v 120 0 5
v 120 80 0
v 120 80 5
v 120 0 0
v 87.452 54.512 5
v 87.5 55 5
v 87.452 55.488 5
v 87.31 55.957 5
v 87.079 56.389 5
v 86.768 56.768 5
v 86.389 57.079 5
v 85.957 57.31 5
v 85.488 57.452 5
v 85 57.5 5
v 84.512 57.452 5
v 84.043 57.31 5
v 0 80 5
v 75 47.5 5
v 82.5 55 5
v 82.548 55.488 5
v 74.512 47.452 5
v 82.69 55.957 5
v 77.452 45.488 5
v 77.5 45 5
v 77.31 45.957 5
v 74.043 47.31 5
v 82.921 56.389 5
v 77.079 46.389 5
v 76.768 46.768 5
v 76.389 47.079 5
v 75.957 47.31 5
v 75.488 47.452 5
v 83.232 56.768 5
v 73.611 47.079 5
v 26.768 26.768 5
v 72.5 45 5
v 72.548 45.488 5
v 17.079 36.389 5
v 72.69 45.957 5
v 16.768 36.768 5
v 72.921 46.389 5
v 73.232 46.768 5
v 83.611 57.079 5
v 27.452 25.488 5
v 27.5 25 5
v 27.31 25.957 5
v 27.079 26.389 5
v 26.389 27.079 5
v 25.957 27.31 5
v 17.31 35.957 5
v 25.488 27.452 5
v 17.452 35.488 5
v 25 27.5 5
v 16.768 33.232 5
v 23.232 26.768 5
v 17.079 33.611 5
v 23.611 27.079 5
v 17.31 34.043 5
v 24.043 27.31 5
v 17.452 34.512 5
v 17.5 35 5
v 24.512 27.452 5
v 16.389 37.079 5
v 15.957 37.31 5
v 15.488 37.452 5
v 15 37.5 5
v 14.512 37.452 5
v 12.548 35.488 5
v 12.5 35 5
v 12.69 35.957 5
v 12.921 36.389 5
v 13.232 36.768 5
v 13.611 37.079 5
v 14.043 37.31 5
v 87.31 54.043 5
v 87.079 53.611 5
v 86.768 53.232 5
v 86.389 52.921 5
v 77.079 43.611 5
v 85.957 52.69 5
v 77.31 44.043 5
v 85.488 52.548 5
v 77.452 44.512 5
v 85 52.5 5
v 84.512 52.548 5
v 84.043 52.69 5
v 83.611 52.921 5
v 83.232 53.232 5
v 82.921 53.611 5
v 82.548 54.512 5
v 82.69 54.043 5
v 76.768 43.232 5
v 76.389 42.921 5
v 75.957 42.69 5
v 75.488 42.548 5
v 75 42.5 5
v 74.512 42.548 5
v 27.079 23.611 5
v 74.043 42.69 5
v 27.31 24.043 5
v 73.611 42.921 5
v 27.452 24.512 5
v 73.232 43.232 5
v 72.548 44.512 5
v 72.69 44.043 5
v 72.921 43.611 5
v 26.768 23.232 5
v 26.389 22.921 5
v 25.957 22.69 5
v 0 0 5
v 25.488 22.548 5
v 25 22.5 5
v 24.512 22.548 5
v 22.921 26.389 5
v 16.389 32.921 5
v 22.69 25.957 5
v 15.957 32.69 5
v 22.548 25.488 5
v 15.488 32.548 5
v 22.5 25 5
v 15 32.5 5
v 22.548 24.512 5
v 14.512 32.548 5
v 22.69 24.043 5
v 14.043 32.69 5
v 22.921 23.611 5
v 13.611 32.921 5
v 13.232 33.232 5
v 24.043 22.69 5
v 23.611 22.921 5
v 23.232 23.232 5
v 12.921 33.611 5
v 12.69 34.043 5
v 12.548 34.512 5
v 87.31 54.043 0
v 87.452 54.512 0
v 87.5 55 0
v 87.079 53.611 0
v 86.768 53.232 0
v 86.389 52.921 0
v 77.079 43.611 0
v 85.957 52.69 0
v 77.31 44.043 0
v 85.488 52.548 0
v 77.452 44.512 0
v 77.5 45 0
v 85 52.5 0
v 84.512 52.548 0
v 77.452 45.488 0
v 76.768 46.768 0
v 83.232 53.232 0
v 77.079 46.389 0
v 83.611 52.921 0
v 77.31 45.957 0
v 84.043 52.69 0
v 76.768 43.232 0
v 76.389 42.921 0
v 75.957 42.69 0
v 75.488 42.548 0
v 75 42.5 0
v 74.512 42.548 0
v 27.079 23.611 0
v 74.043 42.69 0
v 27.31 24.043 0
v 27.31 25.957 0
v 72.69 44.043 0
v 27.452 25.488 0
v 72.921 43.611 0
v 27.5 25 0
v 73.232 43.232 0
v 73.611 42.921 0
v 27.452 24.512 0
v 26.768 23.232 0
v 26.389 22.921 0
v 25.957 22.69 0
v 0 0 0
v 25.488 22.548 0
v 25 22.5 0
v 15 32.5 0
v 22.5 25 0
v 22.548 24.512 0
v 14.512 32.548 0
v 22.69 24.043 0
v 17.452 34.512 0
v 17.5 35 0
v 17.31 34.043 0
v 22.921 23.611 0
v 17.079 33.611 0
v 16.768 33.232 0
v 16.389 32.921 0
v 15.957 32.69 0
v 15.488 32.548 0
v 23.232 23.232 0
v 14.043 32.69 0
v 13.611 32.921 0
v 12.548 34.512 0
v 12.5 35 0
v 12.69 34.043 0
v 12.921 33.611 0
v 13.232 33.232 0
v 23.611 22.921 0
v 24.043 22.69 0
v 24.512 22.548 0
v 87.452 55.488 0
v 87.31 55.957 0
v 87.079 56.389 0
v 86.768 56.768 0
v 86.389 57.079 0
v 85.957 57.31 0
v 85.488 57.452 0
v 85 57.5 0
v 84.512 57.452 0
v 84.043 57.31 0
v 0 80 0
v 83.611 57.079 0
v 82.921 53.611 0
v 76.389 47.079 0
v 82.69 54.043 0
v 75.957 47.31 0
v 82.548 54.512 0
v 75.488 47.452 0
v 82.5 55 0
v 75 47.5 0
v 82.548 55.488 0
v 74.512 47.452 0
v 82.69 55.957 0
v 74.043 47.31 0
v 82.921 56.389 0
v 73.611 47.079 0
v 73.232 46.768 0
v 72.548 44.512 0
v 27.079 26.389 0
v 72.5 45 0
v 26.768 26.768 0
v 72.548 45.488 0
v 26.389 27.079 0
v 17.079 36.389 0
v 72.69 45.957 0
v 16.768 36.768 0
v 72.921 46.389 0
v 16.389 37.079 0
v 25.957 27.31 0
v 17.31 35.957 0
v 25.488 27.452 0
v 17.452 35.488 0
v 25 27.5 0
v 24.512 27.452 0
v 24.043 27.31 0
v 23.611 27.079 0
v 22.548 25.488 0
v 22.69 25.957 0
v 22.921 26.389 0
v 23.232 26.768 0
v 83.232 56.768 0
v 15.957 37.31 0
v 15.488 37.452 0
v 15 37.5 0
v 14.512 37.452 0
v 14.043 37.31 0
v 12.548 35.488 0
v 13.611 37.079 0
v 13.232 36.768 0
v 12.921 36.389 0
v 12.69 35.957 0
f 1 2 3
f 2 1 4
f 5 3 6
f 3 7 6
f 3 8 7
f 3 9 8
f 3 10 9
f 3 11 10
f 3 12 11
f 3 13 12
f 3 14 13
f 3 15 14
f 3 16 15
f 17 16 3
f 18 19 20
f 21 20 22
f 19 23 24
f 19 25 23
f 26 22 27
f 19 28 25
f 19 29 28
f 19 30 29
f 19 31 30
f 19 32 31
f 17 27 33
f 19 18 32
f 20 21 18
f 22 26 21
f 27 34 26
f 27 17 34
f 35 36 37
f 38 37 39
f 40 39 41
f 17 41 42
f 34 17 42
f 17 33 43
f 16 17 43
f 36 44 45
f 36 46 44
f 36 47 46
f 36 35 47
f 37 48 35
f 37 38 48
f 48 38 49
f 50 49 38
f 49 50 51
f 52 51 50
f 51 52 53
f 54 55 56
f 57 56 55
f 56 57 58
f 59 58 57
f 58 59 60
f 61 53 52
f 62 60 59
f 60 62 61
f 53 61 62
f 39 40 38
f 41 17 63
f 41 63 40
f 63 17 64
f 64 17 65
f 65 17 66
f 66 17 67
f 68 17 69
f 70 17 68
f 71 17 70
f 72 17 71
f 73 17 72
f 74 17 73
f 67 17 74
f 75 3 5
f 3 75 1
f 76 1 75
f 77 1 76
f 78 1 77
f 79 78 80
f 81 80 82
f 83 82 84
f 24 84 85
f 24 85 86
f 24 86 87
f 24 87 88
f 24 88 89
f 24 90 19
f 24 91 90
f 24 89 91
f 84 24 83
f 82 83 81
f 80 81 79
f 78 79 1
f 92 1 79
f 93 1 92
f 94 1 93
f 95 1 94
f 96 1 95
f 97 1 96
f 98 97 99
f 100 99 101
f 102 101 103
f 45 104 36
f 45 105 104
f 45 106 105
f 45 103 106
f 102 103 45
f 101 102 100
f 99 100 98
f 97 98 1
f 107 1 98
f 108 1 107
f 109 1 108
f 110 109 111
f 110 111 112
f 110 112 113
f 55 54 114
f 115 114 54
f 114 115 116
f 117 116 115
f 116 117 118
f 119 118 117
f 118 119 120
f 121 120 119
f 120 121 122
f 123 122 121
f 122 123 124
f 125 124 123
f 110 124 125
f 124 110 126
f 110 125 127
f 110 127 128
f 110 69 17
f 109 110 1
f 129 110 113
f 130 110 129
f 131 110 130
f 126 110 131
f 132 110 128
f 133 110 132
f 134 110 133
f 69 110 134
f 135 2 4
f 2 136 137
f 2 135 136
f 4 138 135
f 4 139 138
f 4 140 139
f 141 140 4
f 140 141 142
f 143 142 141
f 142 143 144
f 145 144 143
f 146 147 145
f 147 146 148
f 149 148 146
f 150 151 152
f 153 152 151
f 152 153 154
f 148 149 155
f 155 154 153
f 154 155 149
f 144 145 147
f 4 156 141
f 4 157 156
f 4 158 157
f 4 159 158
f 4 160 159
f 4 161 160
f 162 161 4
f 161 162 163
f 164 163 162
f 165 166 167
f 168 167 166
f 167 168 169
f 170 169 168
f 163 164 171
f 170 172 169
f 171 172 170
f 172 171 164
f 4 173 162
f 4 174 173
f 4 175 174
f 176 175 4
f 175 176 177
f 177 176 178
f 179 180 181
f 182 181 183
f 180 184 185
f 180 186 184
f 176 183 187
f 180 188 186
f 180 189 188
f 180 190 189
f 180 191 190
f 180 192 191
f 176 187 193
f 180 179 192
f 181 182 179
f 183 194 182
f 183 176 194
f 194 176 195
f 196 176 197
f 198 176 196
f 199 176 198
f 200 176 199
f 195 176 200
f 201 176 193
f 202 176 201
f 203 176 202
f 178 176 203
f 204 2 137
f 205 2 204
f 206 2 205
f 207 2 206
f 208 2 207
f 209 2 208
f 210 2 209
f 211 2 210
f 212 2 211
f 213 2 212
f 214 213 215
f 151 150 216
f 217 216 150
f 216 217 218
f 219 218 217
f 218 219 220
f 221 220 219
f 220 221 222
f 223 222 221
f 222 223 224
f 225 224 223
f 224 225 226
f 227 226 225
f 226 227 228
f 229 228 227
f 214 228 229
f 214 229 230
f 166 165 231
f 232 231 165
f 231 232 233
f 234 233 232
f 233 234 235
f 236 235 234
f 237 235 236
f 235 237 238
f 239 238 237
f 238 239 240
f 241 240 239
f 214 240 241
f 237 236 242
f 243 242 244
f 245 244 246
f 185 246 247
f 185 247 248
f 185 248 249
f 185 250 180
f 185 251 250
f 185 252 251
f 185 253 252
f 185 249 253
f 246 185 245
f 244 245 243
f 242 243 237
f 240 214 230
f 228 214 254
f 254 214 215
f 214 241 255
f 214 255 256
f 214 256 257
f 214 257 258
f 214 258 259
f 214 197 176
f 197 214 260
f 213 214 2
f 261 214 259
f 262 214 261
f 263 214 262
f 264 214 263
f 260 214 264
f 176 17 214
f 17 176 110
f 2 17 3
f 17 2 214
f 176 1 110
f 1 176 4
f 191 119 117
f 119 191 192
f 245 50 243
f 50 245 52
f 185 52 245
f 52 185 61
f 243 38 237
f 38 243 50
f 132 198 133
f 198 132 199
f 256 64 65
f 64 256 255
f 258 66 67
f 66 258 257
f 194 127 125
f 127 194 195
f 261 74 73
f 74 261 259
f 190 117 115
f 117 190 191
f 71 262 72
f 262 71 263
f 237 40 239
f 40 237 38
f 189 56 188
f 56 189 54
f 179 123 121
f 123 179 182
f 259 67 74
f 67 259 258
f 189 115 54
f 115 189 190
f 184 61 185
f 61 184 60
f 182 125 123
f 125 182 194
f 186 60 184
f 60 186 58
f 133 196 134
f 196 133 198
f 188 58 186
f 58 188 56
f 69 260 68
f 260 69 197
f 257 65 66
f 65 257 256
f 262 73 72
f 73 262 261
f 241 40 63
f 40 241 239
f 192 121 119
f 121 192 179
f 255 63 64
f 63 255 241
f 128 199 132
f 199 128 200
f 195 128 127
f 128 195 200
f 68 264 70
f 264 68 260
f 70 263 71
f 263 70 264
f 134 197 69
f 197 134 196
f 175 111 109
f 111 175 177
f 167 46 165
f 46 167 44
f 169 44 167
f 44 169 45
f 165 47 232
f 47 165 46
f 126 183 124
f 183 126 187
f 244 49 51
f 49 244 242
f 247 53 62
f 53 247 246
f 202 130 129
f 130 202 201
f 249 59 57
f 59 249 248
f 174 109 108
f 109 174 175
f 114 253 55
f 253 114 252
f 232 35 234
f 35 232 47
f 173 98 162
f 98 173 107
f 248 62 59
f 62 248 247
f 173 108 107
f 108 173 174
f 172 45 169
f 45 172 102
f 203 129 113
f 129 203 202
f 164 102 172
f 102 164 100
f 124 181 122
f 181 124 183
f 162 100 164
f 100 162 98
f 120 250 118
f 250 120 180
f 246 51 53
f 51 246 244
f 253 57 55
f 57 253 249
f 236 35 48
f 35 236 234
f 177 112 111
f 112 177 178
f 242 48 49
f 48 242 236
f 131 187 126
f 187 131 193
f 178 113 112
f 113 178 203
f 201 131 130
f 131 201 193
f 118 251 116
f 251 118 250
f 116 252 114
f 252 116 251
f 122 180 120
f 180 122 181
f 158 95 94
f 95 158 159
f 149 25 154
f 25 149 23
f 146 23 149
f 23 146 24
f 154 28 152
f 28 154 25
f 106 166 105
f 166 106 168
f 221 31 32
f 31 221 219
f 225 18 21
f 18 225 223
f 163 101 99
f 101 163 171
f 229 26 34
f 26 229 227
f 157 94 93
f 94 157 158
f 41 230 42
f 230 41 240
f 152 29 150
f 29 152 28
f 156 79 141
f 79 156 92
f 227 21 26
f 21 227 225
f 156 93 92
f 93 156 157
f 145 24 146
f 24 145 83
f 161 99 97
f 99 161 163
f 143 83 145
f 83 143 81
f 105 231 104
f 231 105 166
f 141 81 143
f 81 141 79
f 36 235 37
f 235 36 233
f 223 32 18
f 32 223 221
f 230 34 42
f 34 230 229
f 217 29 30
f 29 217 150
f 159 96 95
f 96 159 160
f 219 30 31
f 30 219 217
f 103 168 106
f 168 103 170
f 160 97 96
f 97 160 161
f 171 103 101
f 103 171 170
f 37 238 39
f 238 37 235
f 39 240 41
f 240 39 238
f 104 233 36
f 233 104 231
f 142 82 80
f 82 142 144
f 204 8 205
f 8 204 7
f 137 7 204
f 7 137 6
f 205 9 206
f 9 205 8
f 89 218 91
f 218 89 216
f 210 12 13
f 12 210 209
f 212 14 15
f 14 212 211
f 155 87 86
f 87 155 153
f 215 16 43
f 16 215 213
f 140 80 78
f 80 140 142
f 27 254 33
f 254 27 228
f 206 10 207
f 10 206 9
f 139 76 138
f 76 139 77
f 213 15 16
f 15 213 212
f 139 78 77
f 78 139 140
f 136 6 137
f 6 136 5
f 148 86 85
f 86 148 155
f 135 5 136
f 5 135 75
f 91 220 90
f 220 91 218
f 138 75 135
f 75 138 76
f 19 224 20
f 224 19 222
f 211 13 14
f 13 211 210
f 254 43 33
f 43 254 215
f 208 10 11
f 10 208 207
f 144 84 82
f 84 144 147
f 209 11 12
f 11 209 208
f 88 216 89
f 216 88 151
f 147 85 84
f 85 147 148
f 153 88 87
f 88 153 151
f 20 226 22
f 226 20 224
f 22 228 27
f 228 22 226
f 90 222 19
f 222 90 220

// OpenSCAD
$fn = 32;

// ----------------------------------------------------------------------
// Hole field: plate with holes at given coordinates
// ----------------------------------------------------------------------

// --- parameters (mm) ---
plate_l = 120;            // plate length, X
plate_w = 80;             // plate width, Y
plate_t = 5;              // plate thickness, Z
hole_d = 5;               // hole diameter

difference() {
  cube([plate_l, plate_w, plate_t]);
  translate([15, 35, -1]) cylinder(h = plate_t + 2, d = hole_d);
  translate([25, 25, -1]) cylinder(h = plate_t + 2, d = hole_d);
  translate([75, 45, -1]) cylinder(h = plate_t + 2, d = hole_d);
  translate([85, 55, -1]) cylinder(h = plate_t + 2, d = hole_d);
}
